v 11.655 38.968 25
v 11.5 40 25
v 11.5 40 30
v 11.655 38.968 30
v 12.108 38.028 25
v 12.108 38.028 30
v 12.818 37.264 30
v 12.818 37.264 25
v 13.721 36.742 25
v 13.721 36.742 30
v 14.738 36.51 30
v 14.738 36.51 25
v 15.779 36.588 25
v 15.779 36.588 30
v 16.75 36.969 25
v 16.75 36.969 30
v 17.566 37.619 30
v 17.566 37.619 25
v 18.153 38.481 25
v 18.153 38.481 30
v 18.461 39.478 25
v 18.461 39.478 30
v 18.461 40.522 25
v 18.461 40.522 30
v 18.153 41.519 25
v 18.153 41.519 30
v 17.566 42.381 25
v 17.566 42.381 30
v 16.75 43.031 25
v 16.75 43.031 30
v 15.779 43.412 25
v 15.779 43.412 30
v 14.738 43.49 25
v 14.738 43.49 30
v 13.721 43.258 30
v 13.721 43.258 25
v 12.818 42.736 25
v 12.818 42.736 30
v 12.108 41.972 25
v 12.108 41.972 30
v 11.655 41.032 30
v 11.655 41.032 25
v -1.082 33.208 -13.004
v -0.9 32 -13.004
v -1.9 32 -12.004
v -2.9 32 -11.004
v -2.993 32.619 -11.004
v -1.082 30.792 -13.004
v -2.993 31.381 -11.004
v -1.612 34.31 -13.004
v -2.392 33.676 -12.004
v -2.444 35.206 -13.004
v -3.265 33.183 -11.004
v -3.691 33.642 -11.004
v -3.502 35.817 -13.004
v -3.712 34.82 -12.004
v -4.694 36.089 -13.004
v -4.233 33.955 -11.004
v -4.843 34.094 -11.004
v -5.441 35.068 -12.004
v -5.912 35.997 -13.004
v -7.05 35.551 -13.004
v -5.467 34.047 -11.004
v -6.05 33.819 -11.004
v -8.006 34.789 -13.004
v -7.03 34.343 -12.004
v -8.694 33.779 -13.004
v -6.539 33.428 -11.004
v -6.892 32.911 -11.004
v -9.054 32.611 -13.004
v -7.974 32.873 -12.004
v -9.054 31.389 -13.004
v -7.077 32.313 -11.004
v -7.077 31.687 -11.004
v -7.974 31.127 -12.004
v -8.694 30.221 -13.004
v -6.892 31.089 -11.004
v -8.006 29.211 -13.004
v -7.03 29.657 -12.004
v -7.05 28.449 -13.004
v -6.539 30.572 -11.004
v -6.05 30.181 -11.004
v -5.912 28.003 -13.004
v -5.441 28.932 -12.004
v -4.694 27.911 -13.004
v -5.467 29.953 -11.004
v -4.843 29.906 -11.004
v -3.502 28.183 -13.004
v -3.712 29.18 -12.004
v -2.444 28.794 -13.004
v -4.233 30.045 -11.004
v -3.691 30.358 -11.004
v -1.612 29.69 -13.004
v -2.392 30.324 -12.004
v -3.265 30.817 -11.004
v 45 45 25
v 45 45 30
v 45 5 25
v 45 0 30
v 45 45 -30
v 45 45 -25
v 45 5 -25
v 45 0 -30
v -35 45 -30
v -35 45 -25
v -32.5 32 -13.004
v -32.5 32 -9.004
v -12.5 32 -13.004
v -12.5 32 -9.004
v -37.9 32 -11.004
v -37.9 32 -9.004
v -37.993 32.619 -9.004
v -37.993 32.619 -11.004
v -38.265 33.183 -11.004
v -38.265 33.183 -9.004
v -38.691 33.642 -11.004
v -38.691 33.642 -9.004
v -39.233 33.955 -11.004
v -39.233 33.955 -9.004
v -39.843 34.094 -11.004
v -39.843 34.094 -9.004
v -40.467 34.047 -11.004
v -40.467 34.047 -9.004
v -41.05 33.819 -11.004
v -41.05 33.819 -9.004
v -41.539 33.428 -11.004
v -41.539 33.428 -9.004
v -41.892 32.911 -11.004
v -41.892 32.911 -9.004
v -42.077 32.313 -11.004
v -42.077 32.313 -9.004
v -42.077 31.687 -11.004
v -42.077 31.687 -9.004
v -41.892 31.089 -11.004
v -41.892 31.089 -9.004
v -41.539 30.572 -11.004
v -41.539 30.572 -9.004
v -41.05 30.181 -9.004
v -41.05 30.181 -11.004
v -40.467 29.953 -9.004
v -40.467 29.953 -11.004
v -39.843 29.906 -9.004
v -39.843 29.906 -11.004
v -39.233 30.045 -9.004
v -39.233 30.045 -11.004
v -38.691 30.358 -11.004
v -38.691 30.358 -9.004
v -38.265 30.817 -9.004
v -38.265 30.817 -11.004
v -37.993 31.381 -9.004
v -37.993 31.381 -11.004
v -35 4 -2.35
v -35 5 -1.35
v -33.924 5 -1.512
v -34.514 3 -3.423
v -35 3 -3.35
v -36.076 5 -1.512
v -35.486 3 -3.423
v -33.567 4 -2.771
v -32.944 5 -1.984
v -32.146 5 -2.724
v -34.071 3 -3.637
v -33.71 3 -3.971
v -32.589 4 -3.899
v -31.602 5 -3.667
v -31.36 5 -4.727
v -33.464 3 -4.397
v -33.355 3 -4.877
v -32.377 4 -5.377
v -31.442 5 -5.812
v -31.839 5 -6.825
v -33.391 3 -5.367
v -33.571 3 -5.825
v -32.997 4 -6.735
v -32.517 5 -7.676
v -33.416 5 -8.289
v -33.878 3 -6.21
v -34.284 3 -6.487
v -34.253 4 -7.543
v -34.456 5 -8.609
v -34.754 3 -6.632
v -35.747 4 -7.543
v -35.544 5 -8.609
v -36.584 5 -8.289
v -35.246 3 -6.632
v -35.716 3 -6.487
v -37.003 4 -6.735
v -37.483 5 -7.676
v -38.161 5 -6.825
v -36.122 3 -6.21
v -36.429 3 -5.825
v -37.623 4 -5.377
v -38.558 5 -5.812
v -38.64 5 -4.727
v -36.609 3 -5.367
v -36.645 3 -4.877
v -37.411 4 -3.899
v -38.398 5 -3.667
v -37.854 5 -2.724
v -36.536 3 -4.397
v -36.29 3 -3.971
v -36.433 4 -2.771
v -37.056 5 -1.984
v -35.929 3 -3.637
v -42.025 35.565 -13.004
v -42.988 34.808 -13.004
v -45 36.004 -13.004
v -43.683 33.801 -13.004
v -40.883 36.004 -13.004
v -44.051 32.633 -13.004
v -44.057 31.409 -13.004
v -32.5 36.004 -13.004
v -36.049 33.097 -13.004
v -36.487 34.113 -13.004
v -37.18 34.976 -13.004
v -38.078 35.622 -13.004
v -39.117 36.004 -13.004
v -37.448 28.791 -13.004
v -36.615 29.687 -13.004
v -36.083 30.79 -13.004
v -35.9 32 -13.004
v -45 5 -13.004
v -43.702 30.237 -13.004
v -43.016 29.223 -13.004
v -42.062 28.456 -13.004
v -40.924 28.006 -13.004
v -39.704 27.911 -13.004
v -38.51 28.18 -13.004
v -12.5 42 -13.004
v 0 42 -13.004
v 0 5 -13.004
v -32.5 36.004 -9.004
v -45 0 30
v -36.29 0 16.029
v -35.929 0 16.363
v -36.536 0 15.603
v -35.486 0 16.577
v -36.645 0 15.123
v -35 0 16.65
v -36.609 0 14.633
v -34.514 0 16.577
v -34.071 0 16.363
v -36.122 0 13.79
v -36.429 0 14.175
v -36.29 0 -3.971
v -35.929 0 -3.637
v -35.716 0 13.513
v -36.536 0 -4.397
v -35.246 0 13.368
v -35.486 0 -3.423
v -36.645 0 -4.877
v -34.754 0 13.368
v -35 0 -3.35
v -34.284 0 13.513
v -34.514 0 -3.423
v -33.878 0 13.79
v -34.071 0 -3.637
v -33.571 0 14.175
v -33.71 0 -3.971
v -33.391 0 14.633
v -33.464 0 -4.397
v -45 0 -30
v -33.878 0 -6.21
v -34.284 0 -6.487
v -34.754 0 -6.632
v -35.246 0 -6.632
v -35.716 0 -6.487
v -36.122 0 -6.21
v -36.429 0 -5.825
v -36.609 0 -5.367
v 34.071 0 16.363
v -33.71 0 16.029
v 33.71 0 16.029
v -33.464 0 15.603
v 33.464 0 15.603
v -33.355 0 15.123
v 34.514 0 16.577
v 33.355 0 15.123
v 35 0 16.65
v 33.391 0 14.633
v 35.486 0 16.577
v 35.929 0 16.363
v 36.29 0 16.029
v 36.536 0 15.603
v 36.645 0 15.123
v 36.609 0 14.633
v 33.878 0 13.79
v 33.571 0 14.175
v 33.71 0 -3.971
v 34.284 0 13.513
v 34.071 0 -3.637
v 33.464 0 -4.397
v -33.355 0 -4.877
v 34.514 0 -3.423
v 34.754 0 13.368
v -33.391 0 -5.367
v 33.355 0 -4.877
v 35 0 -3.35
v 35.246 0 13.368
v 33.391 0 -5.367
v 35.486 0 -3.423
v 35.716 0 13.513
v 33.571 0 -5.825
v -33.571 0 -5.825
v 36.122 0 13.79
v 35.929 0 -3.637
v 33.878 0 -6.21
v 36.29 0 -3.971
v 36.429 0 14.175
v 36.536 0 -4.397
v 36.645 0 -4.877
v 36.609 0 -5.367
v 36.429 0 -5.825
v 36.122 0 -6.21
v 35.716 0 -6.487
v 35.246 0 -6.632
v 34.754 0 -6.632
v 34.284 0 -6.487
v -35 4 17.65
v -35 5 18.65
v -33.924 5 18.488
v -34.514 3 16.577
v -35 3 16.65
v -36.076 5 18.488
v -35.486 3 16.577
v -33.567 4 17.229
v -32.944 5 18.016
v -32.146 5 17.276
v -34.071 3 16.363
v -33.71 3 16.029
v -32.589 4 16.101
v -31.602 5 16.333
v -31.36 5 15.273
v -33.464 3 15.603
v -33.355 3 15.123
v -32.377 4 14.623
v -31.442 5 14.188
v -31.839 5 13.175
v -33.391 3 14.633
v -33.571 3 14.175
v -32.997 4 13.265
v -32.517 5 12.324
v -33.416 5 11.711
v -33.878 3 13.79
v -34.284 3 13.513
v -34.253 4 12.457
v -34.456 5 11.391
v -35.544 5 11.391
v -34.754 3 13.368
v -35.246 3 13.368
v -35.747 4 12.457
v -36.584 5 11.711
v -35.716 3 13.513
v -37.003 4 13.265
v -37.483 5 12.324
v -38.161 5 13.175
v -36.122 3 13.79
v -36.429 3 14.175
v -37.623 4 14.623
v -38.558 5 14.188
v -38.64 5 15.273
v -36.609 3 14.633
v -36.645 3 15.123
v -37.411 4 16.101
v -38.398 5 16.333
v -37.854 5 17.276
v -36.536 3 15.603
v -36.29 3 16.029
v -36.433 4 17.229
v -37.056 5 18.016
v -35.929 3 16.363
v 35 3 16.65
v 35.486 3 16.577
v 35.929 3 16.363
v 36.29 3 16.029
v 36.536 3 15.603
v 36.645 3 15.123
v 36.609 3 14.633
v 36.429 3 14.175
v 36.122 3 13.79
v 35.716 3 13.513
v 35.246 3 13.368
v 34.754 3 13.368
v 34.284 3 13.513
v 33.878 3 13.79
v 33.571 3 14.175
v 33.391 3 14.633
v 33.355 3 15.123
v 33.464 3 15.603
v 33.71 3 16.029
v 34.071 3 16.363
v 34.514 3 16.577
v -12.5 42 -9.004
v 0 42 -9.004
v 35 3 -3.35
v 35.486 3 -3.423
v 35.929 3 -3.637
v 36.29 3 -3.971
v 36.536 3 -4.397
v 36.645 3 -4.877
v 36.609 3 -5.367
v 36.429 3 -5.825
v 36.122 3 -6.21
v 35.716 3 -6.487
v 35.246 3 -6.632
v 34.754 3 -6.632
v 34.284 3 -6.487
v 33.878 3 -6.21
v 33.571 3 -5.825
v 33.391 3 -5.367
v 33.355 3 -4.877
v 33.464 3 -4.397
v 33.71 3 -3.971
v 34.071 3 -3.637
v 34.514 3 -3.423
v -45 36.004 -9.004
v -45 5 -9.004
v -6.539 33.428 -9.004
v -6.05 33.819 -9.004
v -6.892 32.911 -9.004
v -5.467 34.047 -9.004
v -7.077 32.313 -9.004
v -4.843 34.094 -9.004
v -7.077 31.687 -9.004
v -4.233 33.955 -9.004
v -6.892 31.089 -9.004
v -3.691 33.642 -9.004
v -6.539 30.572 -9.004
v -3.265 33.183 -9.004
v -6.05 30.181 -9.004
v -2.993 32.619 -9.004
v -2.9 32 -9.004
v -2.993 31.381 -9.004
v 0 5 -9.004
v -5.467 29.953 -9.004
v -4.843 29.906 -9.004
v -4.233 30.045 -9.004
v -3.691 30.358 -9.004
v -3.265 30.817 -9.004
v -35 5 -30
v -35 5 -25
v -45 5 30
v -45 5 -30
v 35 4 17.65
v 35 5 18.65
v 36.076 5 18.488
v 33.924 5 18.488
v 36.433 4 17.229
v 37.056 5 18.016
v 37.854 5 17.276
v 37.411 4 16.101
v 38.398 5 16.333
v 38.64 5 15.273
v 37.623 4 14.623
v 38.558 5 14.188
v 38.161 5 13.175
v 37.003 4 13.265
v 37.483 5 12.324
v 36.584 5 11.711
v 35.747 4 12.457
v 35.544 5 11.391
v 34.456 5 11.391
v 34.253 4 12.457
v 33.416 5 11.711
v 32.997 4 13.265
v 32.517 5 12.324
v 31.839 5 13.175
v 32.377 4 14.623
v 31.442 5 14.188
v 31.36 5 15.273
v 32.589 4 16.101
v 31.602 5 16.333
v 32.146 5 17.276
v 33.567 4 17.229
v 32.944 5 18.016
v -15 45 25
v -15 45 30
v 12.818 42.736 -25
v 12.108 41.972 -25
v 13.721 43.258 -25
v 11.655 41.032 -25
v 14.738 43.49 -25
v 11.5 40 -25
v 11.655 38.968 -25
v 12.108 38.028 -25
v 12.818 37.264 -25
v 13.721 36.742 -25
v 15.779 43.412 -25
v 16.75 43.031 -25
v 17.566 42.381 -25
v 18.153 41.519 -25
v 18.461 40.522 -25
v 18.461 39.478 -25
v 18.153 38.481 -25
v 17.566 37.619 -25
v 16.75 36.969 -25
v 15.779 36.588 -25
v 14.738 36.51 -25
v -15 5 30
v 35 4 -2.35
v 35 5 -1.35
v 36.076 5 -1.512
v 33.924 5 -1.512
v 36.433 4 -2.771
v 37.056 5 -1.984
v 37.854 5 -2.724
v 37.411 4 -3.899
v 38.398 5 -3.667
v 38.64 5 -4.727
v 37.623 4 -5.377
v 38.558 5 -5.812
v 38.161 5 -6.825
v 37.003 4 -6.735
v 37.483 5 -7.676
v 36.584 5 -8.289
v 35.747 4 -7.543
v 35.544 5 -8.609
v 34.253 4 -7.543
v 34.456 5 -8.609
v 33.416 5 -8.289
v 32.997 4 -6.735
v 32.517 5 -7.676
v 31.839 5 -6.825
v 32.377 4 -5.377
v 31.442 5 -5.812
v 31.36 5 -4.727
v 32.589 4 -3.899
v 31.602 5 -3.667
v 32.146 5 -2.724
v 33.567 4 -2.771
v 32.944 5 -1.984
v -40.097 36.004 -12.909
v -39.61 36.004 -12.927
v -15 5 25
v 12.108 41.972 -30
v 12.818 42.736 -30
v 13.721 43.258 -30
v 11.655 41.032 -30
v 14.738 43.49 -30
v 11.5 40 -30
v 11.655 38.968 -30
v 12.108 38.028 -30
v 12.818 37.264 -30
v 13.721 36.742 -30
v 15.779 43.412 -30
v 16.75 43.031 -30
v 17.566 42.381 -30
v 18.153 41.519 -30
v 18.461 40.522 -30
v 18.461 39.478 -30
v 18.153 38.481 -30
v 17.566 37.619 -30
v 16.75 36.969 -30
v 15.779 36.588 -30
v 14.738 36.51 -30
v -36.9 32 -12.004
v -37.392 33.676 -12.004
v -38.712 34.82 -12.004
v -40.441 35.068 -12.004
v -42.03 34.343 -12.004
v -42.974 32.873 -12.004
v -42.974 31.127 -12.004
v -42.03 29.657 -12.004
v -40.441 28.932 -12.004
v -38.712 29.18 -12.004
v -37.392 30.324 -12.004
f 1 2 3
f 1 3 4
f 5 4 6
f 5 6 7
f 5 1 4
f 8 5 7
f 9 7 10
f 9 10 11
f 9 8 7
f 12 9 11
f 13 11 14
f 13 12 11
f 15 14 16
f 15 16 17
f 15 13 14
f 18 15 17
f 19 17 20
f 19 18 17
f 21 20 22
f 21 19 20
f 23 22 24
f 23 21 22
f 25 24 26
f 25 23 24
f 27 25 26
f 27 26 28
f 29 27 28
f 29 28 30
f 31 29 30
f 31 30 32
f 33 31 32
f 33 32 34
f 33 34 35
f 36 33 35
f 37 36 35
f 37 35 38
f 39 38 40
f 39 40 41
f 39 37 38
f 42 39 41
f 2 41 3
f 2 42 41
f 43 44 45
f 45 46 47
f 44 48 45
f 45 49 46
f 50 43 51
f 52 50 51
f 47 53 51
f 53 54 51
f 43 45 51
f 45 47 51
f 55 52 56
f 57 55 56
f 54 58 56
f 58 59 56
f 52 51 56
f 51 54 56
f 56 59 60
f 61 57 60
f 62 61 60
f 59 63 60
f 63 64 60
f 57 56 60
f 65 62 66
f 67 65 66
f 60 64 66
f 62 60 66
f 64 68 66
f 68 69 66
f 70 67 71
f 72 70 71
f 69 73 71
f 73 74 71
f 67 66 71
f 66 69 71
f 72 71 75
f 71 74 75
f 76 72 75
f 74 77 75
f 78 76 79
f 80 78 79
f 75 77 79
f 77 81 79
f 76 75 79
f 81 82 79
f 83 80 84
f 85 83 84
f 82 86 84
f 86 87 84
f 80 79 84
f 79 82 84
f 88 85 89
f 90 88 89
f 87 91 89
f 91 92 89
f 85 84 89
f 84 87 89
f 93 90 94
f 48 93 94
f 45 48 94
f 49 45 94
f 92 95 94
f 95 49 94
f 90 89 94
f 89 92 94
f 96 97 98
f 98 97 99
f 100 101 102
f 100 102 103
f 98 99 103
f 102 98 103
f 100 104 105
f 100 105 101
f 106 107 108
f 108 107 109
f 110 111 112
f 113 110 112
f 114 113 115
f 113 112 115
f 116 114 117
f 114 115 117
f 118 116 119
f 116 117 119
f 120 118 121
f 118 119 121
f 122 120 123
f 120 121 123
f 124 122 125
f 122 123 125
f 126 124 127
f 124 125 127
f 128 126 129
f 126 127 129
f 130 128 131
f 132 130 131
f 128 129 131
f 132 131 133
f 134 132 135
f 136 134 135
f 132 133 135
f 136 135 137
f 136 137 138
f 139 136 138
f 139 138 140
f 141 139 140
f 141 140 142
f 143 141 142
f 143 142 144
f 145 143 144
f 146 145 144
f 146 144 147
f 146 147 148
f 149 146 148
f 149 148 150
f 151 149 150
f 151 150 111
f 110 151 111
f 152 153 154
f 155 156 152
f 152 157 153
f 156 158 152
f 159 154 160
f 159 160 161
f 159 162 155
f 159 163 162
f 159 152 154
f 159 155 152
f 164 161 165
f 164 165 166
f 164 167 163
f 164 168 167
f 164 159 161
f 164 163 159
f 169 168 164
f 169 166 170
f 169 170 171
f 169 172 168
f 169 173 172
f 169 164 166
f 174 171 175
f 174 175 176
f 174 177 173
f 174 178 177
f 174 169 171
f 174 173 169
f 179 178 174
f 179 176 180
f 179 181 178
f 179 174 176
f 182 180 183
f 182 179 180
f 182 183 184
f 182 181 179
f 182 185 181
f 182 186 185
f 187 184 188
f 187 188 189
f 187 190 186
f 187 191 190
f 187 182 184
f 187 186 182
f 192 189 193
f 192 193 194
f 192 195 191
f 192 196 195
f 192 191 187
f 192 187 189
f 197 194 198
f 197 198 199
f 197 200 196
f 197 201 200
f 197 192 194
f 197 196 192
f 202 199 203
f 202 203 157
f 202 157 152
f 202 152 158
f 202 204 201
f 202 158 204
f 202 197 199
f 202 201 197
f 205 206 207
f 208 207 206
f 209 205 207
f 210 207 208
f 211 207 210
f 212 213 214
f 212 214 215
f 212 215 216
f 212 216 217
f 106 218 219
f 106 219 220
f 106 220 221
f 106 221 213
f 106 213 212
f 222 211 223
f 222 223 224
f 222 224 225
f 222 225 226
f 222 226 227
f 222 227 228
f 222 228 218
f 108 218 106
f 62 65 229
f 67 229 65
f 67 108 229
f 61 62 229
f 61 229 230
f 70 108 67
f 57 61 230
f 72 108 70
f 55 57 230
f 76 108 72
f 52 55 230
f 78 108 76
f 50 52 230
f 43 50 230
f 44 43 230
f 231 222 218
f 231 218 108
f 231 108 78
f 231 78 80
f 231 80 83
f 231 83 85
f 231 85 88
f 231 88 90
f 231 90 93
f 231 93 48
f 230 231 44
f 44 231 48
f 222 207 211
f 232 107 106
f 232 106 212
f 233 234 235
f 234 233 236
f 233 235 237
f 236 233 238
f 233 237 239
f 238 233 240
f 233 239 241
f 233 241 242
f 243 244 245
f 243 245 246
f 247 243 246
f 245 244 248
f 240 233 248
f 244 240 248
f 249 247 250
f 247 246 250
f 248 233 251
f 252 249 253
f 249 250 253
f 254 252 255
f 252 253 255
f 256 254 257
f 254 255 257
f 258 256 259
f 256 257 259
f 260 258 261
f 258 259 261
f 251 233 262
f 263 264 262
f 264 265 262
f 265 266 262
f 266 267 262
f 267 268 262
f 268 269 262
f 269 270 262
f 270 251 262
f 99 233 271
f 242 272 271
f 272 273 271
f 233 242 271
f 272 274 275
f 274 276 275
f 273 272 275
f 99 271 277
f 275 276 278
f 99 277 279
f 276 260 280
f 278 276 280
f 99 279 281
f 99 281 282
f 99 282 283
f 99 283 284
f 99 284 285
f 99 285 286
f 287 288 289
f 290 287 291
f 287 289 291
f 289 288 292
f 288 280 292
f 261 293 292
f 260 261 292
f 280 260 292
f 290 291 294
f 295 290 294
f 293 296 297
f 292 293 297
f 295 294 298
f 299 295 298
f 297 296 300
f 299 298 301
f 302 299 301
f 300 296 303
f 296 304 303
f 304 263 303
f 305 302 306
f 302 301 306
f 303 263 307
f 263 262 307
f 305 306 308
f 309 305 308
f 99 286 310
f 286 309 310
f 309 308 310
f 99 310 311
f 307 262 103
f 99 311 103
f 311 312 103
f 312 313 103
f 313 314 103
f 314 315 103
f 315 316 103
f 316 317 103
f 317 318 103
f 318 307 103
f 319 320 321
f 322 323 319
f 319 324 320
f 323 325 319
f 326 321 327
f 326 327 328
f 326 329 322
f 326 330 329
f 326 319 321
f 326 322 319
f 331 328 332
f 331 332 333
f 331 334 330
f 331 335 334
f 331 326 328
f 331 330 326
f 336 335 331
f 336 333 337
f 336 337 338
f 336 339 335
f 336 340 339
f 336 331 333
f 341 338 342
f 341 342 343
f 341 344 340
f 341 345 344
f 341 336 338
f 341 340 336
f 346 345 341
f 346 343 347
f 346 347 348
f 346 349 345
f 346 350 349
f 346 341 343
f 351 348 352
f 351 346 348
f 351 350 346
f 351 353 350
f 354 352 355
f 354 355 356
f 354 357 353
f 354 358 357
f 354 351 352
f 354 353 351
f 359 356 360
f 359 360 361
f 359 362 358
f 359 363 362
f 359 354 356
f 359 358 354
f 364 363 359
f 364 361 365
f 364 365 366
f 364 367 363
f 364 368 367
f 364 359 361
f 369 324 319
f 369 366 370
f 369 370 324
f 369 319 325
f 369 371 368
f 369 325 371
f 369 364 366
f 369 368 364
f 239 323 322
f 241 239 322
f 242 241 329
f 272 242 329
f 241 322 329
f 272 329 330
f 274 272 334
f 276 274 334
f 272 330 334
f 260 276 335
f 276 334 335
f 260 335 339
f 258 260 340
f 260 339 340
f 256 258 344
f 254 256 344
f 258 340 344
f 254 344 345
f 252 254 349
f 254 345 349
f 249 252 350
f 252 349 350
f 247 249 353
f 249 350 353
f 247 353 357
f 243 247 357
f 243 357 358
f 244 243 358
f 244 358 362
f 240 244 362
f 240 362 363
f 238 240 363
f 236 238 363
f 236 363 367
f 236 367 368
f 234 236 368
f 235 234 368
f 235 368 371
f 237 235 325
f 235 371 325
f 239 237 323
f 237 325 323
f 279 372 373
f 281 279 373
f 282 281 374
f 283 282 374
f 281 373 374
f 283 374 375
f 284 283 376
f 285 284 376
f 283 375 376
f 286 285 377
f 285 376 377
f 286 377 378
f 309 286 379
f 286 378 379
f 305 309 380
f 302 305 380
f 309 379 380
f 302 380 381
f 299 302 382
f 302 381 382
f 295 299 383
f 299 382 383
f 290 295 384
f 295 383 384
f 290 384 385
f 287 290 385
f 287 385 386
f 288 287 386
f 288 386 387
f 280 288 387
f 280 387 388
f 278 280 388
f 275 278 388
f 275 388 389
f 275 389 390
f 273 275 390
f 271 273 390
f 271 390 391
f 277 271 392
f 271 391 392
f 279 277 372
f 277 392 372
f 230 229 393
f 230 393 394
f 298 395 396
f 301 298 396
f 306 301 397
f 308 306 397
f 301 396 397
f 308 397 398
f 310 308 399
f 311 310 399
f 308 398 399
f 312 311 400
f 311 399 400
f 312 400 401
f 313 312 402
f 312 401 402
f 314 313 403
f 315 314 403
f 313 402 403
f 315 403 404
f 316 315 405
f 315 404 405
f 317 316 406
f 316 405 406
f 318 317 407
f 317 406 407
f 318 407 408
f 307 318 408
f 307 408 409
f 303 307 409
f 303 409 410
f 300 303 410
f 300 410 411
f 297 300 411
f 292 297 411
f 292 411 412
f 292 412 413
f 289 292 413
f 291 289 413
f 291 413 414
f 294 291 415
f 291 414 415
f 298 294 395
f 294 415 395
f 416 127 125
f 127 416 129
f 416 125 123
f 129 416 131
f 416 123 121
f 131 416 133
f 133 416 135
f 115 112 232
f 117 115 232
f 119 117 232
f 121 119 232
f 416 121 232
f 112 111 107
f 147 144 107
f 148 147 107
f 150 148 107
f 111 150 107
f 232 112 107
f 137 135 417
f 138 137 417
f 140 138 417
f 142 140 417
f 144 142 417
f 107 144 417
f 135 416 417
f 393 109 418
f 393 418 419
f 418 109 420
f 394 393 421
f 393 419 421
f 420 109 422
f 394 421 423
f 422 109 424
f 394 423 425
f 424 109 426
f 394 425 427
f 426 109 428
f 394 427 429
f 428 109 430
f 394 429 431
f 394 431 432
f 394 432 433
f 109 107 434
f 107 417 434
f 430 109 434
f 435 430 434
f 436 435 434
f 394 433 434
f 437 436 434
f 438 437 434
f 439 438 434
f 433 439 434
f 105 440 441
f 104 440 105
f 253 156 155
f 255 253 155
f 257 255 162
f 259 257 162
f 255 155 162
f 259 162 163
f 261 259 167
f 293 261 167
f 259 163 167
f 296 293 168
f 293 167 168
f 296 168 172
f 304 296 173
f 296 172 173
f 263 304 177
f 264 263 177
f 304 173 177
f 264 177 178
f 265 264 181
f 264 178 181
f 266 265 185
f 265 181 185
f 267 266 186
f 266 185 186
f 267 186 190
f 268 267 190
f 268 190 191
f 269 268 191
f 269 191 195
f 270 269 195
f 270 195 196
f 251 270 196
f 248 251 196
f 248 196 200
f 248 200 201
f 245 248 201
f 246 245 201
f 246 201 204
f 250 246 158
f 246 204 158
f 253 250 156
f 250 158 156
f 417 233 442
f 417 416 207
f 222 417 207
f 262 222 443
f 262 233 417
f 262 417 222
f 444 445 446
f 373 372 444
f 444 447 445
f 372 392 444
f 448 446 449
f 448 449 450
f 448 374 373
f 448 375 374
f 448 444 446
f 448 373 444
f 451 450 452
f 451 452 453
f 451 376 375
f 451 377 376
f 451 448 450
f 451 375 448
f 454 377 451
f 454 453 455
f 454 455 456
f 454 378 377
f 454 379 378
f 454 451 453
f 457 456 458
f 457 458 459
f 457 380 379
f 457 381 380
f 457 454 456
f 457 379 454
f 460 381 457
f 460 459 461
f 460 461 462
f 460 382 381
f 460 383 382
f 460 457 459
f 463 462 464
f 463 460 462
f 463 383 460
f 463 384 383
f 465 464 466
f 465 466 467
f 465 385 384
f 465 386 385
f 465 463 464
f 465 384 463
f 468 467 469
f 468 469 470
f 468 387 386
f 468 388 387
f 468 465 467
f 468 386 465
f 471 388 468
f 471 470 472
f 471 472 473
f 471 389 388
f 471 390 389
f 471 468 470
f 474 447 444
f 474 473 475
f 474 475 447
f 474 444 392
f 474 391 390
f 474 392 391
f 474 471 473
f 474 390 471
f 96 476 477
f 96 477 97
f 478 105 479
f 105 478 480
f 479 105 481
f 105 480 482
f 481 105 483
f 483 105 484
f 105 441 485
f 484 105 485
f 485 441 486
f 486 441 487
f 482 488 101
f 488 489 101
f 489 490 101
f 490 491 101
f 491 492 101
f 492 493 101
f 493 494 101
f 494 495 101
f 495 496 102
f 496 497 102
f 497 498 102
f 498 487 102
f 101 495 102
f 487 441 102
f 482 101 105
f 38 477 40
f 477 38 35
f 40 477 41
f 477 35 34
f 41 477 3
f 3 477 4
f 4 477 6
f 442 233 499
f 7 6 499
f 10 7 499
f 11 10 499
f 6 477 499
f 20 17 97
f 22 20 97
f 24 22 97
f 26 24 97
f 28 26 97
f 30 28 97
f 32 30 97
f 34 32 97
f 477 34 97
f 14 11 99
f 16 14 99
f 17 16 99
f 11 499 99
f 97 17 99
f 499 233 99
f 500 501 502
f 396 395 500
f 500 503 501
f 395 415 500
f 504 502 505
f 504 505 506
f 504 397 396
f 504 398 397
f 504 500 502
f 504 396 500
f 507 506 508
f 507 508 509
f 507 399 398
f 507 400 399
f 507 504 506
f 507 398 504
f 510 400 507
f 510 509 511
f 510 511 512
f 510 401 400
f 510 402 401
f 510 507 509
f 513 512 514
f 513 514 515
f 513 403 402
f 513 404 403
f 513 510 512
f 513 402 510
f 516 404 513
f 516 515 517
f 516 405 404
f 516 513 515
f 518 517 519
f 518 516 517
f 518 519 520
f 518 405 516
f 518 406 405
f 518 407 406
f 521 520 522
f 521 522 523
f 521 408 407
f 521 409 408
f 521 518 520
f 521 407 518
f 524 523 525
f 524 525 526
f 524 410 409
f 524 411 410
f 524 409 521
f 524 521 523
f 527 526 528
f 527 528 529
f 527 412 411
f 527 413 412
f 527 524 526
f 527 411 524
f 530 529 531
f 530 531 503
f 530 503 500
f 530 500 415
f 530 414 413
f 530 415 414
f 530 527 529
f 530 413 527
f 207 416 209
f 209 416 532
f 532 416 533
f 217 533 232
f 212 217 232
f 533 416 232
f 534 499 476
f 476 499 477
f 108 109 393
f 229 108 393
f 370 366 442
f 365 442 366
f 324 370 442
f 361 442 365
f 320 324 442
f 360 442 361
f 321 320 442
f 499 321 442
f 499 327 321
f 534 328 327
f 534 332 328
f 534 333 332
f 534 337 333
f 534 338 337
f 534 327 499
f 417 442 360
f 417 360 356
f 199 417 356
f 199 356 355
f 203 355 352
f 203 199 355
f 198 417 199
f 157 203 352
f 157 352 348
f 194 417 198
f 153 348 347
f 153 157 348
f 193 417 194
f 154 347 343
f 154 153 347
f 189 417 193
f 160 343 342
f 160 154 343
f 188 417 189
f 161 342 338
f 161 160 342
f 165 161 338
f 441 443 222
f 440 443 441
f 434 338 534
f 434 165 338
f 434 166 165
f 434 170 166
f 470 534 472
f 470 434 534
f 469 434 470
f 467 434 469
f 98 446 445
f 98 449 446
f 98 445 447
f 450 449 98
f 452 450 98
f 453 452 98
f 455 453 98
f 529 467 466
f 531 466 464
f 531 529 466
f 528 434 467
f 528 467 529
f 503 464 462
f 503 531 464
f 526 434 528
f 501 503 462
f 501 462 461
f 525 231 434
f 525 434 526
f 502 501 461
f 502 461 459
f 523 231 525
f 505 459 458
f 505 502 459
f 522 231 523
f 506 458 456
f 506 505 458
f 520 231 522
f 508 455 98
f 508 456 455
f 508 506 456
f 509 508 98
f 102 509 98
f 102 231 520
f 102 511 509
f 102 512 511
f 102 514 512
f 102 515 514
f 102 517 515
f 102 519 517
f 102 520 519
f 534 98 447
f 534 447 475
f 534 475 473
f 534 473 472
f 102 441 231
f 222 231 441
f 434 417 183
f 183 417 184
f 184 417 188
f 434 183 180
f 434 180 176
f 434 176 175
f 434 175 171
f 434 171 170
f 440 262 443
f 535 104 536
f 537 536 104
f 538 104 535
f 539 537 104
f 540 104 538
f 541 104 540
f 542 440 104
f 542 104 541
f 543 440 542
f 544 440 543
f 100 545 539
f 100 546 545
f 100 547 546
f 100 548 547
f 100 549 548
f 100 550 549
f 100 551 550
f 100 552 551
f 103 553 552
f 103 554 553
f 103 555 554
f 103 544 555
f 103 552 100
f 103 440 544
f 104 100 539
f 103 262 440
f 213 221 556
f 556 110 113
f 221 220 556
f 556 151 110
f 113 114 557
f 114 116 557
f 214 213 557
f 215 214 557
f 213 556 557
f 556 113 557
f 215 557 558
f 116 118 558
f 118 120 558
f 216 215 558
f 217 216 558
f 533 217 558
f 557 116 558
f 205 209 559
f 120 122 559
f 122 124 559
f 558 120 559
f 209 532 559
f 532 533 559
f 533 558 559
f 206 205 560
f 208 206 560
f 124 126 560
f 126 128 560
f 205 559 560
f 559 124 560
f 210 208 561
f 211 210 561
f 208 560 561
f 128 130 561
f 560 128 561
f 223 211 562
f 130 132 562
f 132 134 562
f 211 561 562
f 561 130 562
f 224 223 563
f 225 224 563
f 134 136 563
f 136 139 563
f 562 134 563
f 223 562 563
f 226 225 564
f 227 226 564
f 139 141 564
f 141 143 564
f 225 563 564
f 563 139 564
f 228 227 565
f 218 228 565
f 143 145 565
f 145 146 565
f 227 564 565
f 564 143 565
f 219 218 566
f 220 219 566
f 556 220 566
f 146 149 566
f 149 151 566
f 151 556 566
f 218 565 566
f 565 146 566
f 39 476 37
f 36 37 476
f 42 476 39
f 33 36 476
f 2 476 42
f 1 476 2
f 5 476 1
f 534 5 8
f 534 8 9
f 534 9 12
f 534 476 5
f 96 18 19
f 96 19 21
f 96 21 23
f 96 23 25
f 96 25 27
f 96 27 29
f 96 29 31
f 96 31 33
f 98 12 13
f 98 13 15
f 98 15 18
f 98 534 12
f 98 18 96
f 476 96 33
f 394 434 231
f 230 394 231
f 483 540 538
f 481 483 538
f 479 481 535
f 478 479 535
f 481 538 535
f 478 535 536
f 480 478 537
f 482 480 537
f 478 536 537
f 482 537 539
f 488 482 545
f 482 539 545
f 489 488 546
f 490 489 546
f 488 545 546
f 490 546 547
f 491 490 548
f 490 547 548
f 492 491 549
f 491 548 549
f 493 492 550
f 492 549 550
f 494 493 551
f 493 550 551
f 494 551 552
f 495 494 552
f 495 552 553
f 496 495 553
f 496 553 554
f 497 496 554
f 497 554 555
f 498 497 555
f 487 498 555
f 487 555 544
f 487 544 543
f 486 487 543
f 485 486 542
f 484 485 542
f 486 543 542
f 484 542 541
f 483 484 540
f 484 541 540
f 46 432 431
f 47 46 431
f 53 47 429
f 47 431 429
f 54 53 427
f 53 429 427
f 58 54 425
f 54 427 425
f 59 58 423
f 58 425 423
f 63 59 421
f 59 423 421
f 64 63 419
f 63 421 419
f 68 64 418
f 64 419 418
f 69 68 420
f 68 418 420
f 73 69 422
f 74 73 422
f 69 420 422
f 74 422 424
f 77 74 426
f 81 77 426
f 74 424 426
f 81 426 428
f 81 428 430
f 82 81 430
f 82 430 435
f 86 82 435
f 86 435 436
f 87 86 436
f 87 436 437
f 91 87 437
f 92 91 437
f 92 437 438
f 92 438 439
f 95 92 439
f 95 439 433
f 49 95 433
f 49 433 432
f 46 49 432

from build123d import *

# Parameters (mm, degrees)
SKIZZE1_W                       = 90
SKIZZE1_H                       = 60
AUFSATZ_LINEAR_AUSTRAGEN1_DEPTH = 5
SKIZZE2_W                       = 90
SKIZZE2_H                       = 5
AUFSATZ_LINEAR_AUSTRAGEN2_DEPTH = 40
SKIZZE3_W                       = 45
SKIZZE3_H                       = 4
AUFSATZ_LINEAR_AUSTRAGEN3_DEPTH = 37
SKIZZE4_R                       = 2.1
SKIZZE4_W                       = 20
SKIZZE4_H                       = 10
SCHNITT_LINEAR_AUSTRAGEN1_DEPTH = 5
FASE1_SIZE                      = 2
FASE2_SIZE                      = 2
SKIZZE6_R                       = 3.5
SCHNITT_LINEAR_AUSTRAGEN2_DEPTH = 5
SCHNITT_LINEAR_START            = -5
SKIZZE8_R                       = 3.5
SCHNITT_LINEAR_AUSTRAGEN3_DEPTH = 5
SKIZZE9_R                       = 1.65
SCHNITT_LINEAR_AUSTRAGEN4_DEPTH = 5
FASE3_SIZE                      = 2
SKIZZE10_W                      = 30
SKIZZE10_H                      = 40
SCHNITT_LINEAR_AUSTRAGEN5_DEPTH = 10
SKIZZE11_W                      = 12.5
SKIZZE11_H                      = 5.996169329
SCHNITT_LINEAR_AUSTRAGEN6_DEPTH = 10
SKIZZE12_W                      = 10
SKIZZE12_H                      = 40
SCHNITT_LINEAR_AUSTRAGEN7_DEPTH = 10


with BuildPart() as part:
    # Skizze1 → Aufsatz-Linear austragen1 (new body)
    with BuildSketch(Plane(origin=(0, 0, 0), x_dir=(1, 0, 0), z_dir=(0, 1, 0))):
        Rectangle(SKIZZE1_W, SKIZZE1_H)
    extrude(amount=AUFSATZ_LINEAR_AUSTRAGEN1_DEPTH)

    # Skizze2 → Aufsatz-Linear austragen2 (add)
    with BuildSketch(Plane(origin=(0, 5, 0), x_dir=(1, 0, 0), z_dir=(0, 1, 0))):
        with Locations((0, 27.5)):
            Rectangle(SKIZZE2_W, SKIZZE2_H)
        with Locations((0, -27.5)):
            Rectangle(SKIZZE2_W, SKIZZE2_H)
    extrude(amount=AUFSATZ_LINEAR_AUSTRAGEN2_DEPTH)

    # Skizze3 → Aufsatz-Linear austragen3 (add)
    with BuildSketch(Plane(origin=(0, 5, 0), x_dir=(1, 0, 0), z_dir=(0, 1, 0))):
        with Locations((-22.5, 11.004200432)):
            Rectangle(SKIZZE3_W, SKIZZE3_H)
    extrude(amount=AUFSATZ_LINEAR_AUSTRAGEN3_DEPTH)

    # Skizze4 → Schnitt-Linear austragen1 (cut)
    with BuildSketch(Plane.XY.offset(-9.004200432)):
        with Locations((-40, 32)):
            Circle(SKIZZE4_R)
        with Locations((-5, 32)):
            Circle(SKIZZE4_R)
        with Locations((-22.5, 37)):
            Rectangle(SKIZZE4_W, SKIZZE4_H)
    extrude(amount=-SCHNITT_LINEAR_AUSTRAGEN1_DEPTH, mode=Mode.SUBTRACT)

    # Fase1
    fase1_edges = [part.edges().sort_by_distance(p)[0] for p in [
        (-42.1, 32, -13.004200432),
    ]]
    chamfer(fase1_edges, length=FASE1_SIZE)

    # Fase2
    fase2_edges = [part.edges().sort_by_distance(p)[0] for p in [
        (-7.1, 32, -13.004200432),
    ]]
    chamfer(fase2_edges, length=FASE2_SIZE)

    # Skizze6 → Schnitt-Linear austragen2 (cut)
    with BuildSketch(Plane(origin=(0, 0, -30), x_dir=(-1, 0, 0), z_dir=(0, 0, -1))):
        with Locations((-15, 40)):
            Circle(SKIZZE6_R)
    extrude(amount=-SCHNITT_LINEAR_AUSTRAGEN2_DEPTH, mode=Mode.SUBTRACT)

    # Skizze8 → Schnitt-Linear austragen3 (cut)
    with BuildSketch(Plane.XY.offset(30).offset(SCHNITT_LINEAR_START)):
        with Locations(Location((15, 40, 0), (0, 0, 180))):
            Circle(SKIZZE8_R)
    extrude(amount=SCHNITT_LINEAR_AUSTRAGEN3_DEPTH, mode=Mode.SUBTRACT)

    # Skizze9 → Schnitt-Linear austragen4 (cut)
    with BuildSketch(Plane(origin=(0, 5, 0), x_dir=(1, 0, 0), z_dir=(0, 1, 0))):
        with Locations(Location((35, 5, 0), (0, 0, 270))):
            Circle(SKIZZE9_R)
        with Locations(Location((35, -15, 0), (0, 0, 270))):
            Circle(SKIZZE9_R)
        with Locations(Location((-35, -15, 0), (0, 0, 270))):
            Circle(SKIZZE9_R)
        with Locations(Location((-35, 5, 0), (0, 0, 270))):
            Circle(SKIZZE9_R)
    extrude(amount=-SCHNITT_LINEAR_AUSTRAGEN4_DEPTH, mode=Mode.SUBTRACT)

    # Fase3
    fase3_edges = [part.edges().sort_by_distance(p)[0] for p in [
        (-35, 5, -6.65),
        (-35, 5, 13.35),
        (35, 5, 13.35),
        (35, 5, -6.65),
    ]]
    chamfer(fase3_edges, length=FASE3_SIZE)

    # Skizze10 → Schnitt-Linear austragen5 (cut)
    with BuildSketch(Plane.XY.offset(30)):
        with Locations((-30, 25)):
            Rectangle(SKIZZE10_W, SKIZZE10_H)
    extrude(amount=-SCHNITT_LINEAR_AUSTRAGEN5_DEPTH, mode=Mode.SUBTRACT)

    # Skizze11 → Schnitt-Linear austragen6 (cut)
    with BuildSketch(Plane.XY.offset(-9.004200432)):
        with Locations((-38.75, 39.001915336)):
            Rectangle(SKIZZE11_W, SKIZZE11_H)
    extrude(amount=-SCHNITT_LINEAR_AUSTRAGEN6_DEPTH, mode=Mode.SUBTRACT)

    # Skizze12 → Schnitt-Linear austragen7 (cut)
    with BuildSketch(Plane(origin=(0, 0, -30), x_dir=(-1, 0, 0), z_dir=(0, 0, -1))):
        with Locations((40, 25)):
            Rectangle(SKIZZE12_W, SKIZZE12_H)
    extrude(amount=-SCHNITT_LINEAR_AUSTRAGEN7_DEPTH, mode=Mode.SUBTRACT)


solid = part.part
